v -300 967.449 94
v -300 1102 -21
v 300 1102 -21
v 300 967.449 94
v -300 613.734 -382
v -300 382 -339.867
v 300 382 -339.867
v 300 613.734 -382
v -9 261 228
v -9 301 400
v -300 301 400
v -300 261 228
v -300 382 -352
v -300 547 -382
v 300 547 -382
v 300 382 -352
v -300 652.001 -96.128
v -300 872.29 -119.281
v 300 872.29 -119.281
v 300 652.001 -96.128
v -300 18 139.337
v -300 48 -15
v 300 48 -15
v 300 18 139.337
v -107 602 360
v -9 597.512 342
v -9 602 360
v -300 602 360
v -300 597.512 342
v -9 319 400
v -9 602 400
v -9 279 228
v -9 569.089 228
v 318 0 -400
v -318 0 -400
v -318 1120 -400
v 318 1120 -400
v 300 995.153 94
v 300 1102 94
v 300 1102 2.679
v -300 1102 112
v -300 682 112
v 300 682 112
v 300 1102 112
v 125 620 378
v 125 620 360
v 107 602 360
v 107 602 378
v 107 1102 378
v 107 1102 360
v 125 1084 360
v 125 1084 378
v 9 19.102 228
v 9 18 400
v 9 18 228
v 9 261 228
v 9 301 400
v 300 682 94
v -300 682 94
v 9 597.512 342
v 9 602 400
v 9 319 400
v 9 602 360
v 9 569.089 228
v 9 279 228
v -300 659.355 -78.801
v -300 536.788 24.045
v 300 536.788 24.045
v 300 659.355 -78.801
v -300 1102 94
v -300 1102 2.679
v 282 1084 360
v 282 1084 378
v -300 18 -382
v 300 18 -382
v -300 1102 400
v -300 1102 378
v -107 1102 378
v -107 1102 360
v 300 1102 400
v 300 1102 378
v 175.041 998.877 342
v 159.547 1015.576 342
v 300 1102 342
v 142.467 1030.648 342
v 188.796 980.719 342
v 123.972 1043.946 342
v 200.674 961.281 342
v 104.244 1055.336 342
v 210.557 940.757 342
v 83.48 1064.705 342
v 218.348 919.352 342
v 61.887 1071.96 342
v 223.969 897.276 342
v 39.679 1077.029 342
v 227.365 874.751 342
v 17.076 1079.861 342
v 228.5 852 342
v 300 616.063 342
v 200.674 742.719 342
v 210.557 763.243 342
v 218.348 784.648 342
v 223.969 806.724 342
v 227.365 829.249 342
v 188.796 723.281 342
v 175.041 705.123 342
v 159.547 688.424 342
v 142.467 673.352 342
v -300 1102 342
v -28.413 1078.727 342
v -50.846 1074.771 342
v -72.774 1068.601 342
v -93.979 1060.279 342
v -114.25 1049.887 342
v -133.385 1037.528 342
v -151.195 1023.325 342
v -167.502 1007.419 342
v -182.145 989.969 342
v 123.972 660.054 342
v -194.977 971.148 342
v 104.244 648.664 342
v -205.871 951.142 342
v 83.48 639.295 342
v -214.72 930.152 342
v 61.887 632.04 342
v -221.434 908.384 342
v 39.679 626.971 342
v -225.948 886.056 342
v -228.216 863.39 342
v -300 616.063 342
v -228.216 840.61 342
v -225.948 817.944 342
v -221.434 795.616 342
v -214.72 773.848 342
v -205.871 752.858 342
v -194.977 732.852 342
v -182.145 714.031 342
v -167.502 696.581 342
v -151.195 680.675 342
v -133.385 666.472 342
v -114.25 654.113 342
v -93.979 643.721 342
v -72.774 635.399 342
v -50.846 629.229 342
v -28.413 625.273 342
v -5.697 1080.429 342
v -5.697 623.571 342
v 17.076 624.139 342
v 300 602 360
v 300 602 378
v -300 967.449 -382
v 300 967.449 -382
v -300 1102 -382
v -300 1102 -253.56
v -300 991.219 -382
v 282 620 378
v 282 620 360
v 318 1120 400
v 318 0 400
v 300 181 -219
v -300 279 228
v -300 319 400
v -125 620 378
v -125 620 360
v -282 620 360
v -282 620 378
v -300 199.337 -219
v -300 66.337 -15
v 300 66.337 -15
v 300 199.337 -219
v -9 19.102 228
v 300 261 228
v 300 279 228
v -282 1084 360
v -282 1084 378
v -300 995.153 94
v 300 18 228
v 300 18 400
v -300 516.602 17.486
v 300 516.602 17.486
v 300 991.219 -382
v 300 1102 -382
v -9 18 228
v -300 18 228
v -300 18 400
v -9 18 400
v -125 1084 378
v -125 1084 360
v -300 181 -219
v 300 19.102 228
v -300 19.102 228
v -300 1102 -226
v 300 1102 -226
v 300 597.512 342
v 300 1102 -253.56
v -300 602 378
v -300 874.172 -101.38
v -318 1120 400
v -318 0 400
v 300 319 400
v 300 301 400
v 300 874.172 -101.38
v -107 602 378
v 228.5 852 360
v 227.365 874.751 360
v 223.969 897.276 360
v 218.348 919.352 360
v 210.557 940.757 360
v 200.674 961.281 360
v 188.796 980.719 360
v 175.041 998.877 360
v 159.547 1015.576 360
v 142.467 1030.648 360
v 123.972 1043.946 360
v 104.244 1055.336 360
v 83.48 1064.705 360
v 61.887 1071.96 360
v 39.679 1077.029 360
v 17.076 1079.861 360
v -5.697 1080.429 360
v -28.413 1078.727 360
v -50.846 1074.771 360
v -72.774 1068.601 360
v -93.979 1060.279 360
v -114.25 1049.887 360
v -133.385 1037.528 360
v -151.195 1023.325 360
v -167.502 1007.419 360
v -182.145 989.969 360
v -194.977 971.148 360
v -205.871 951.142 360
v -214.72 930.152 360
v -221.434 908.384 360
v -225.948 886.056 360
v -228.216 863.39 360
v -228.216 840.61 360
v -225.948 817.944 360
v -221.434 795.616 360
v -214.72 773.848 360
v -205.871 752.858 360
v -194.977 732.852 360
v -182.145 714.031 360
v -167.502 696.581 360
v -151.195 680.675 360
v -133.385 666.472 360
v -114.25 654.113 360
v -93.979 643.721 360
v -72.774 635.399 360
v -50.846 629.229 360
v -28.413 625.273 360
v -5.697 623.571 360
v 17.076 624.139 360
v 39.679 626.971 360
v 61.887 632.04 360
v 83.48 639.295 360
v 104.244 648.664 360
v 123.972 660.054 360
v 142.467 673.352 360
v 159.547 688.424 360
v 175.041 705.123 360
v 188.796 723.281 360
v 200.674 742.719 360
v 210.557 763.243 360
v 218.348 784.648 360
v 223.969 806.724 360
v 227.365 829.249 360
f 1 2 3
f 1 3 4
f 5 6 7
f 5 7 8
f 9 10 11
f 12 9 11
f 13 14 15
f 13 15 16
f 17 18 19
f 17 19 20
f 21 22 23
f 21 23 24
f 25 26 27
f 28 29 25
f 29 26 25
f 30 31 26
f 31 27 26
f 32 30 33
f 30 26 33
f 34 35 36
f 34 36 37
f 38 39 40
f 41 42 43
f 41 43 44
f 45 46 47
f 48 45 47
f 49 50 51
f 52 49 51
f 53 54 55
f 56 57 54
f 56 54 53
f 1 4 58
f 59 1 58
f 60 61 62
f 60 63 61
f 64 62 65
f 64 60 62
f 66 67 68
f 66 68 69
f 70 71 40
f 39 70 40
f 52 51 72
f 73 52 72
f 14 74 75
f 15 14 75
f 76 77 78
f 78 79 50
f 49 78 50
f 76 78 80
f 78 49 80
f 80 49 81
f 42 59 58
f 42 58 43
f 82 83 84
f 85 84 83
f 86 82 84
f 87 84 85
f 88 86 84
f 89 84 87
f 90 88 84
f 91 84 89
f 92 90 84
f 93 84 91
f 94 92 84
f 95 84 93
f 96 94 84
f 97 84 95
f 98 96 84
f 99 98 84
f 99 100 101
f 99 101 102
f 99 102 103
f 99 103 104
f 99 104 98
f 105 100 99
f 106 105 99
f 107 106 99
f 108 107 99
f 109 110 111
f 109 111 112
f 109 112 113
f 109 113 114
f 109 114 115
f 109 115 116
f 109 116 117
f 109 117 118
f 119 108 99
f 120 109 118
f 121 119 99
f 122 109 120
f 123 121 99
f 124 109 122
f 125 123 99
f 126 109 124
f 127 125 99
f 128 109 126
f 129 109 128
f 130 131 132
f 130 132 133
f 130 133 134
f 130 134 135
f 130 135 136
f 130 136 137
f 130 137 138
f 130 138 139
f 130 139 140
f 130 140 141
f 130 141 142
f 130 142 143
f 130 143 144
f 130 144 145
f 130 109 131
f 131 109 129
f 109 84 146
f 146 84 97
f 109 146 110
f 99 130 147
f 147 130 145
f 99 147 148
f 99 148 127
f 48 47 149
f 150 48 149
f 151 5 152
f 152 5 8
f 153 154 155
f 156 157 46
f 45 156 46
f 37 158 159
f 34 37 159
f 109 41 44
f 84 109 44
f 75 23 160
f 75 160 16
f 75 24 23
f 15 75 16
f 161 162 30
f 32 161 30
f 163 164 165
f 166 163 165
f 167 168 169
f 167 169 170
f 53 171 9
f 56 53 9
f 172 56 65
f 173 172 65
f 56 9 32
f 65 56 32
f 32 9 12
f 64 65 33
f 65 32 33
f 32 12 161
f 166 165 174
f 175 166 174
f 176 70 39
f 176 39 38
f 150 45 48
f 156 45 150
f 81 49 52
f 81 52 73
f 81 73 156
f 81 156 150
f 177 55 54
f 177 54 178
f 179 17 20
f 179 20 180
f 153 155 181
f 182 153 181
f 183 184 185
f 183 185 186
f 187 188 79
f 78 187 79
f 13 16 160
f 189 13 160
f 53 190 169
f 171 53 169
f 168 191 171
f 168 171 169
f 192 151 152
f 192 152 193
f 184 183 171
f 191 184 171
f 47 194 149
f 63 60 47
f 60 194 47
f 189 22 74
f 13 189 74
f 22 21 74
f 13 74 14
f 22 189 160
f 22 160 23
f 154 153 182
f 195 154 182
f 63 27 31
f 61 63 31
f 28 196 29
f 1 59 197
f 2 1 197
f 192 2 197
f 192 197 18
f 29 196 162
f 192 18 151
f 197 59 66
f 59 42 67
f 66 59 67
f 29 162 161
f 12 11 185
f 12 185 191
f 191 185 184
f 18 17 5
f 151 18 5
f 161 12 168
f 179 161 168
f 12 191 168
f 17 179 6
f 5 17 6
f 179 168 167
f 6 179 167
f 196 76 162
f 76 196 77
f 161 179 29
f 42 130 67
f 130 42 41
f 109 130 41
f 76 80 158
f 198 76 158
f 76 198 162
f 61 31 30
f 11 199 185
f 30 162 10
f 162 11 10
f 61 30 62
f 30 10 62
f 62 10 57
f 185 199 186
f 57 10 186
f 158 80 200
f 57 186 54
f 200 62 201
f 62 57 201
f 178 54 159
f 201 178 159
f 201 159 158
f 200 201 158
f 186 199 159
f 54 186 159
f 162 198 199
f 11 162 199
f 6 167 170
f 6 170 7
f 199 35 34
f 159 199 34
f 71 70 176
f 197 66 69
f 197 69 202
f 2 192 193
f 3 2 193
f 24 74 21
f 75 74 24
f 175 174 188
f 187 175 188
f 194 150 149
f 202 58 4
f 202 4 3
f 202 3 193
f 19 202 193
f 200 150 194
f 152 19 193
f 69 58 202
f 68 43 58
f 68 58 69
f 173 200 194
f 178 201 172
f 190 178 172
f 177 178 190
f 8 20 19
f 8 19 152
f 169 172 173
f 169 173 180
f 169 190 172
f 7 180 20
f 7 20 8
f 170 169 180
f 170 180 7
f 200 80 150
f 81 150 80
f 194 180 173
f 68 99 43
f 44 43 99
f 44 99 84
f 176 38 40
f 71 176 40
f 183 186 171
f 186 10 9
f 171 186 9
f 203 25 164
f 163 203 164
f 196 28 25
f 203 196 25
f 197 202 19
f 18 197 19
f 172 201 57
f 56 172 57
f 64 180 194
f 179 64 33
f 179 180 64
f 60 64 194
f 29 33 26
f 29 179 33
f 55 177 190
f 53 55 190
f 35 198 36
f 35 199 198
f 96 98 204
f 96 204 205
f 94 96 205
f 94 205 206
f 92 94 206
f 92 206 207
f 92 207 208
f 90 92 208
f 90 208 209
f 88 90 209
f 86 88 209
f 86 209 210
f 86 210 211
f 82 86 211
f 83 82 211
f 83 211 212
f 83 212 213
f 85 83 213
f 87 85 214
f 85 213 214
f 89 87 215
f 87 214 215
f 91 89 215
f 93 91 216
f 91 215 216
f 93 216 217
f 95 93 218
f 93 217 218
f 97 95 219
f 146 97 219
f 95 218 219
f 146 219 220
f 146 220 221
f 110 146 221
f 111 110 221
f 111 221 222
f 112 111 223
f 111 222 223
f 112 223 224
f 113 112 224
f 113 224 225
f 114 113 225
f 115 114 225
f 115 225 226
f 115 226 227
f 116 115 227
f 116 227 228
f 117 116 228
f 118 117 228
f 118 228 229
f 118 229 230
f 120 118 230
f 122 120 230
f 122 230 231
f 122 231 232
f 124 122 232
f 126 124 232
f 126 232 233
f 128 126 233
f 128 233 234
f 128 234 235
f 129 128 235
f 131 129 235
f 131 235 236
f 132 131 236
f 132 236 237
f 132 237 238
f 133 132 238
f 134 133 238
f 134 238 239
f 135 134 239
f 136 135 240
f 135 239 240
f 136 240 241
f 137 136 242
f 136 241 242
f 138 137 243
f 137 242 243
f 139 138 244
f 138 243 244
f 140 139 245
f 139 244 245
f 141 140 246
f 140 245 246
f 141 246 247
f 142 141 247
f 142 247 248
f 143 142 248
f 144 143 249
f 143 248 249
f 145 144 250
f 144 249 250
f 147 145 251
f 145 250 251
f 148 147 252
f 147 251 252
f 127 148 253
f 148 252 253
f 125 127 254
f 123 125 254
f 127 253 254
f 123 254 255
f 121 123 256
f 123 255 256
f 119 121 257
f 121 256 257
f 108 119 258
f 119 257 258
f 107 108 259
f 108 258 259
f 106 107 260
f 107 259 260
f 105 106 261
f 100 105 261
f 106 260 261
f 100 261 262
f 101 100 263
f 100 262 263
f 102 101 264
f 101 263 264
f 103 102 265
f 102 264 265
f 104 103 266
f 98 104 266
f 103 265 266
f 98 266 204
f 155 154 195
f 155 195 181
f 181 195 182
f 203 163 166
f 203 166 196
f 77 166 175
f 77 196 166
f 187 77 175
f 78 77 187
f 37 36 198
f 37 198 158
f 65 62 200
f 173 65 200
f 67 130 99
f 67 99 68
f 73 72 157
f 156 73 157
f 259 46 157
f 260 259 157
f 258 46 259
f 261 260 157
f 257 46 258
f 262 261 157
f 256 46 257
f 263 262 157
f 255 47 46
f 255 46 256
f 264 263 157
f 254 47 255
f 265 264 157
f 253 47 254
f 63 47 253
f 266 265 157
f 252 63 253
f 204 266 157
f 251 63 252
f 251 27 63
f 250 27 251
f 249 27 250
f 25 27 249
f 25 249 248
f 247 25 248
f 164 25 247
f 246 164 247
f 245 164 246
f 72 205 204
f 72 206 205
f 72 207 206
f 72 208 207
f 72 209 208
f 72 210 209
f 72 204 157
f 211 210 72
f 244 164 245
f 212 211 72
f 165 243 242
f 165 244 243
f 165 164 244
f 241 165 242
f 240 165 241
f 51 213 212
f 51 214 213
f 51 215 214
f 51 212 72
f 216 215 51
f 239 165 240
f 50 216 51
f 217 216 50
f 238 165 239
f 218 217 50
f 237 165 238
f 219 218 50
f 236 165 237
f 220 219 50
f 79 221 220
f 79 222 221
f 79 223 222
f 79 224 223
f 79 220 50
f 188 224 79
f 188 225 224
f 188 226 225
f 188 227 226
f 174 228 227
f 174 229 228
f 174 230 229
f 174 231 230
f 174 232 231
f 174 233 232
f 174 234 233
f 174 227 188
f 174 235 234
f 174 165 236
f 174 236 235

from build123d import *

# Parameters (mm, degrees)
SKETCH1_W           = 636
SKETCH1_H           = 800
BOSS_EXTRUDE1_DEPTH = 18
BOSS_EXTRUDE2_DEPTH = 636
SKETCH4_W           = 636
SKETCH4_H           = 18
BOSS_EXTRUDE3_DEPTH = 1084
SKETCH5_W           = 636
SKETCH5_H           = 800
BOSS_EXTRUDE4_DEPTH = 18
BOSS_EXTRUDE6_DEPTH = 18
SKETCH11_W          = 18
SKETCH11_H          = 800
BOSS_EXTRUDE7_DEPTH = 1084
SKETCH13_W          = 636
SKETCH13_H          = 18
SKETCH15_W          = 18
SKETCH15_H          = 800
BOSS_EXTRUDE8_DEPTH = 1084
SKETCH16_R          = 228.5
CUT_EXTRUDE1_DEPTH  = 18.1
SKETCH17_W          = 18
SKETCH17_H          = 18
BOSS_EXTRUDE9_DEPTH = 18


with BuildPart() as part:
    # Sketch1 → Boss-Extrude1 (new body)
    with BuildSketch(Plane(origin=(0, 0, 0), x_dir=(1, 0, 0), z_dir=(0, 1, 0))):
        Rectangle(SKETCH1_W, SKETCH1_H)
    extrude(amount=BOSS_EXTRUDE1_DEPTH)

    # Sketch3 → Boss-Extrude2 (add)
    with BuildSketch(Plane.ZY.offset(318)):
        Polygon((139.336620479, 18), (228, 18), (228, 19.102485389), (-15, 66.336900509), (-219, 199.336900509), (-339.866628021, 382), (-382, 613.733545883), (-382, 547), (-352, 382), (-219, 181), (-15, 48), align=None)
        Polygon((360, 602), (360, 1102), (342, 1102), (342, 616.063141277), (24.044559613, 536.787946332), (-78.801457937, 659.355057231), (-101.379606002, 874.171786631), (-119.281000119, 872.290274292), (-96.127616004, 652.00053947), (4.612607271, 531.943016464), (17.485608625, 516.601570853), (342, 597.512095949), align=None)
        Polygon((112, 682), (112, 1102), (94, 1102), (94, 995.153242294), (2.678735209, 1102), (-21, 1102), (94, 967.448894468), (94, 682), align=None)
        Polygon((-226, 1102), (-253.559600781, 1102), (-382, 991.219245449), (-382, 967.448894468), align=None)
    extrude(amount=-BOSS_EXTRUDE2_DEPTH)


with BuildPart() as boss_extrude2_piece_1:
    # of the separate pieces the step leaves, piece 1, a body of its own (boss_extrude2_pieces)
    add(part.part.solids().sort_by_distance((-318, 0, 400))[0])



with BuildPart() as boss_extrude2_piece_2:
    # of the separate pieces the step leaves, piece 2, a body of its own (boss_extrude2_pieces)
    add(part.part.solids().sort_by_distance((-318, 602, 360))[0])


with BuildPart() as boss_extrude2_piece_3:
    # of the separate pieces the step leaves, piece 3, a body of its own (boss_extrude2_pieces)
    add(part.part.solids().sort_by_distance((-318, 682, 112))[0])


with BuildPart() as boss_extrude2_piece_4:
    # of the separate pieces the step leaves, piece 4, a body of its own (boss_extrude2_pieces)
    add(part.part.solids().sort_by_distance((-318, 1102, -226))[0])


with BuildPart() as boss_extrude2_piece_1_1:
    add(boss_extrude2_piece_1.part)

    add(boss_extrude2_piece_4.part)  # Boss-Extrude3 merges Boss-Extrude2 piece 4
    # Sketch4 → Boss-Extrude3 (add)
    with BuildSketch(Plane(origin=(0, 18, 0), x_dir=(1, 0, 0), z_dir=(0, 1, 0))):
        with Locations((0, 391)):
            Rectangle(SKETCH4_W, SKETCH4_H)
    extrude(amount=BOSS_EXTRUDE3_DEPTH)


    add(boss_extrude2_piece_2.part)  # Boss-Extrude4 merges Boss-Extrude2 piece 2

    add(boss_extrude2_piece_3.part)  # Boss-Extrude4 merges Boss-Extrude2 piece 3
    # Sketch5 → Boss-Extrude4 (add)
    with BuildSketch(Plane(origin=(0, 1102, 0), x_dir=(1, 0, 0), z_dir=(0, 1, 0))):
        Rectangle(SKETCH5_W, SKETCH5_H)
    extrude(amount=BOSS_EXTRUDE4_DEPTH)

    # Sketch10 → Boss-Extrude6 (add)
    with BuildSketch(Plane.ZY.offset(9)):
        Polygon((400, 18), (228, 18), (228, 569.088703625), (360, 602), (400, 602), align=None)
    extrude(amount=-BOSS_EXTRUDE6_DEPTH)

    # Sketch11 → Boss-Extrude7 (add)
    with BuildSketch(Plane(origin=(0, 18, 0), x_dir=(1, 0, 0), z_dir=(0, 1, 0))):
        with Locations((309, 0)):
            Rectangle(SKETCH11_W, SKETCH11_H)
    extrude(amount=BOSS_EXTRUDE7_DEPTH)

    # Sweep1: sweep along a path in Sketch14
    with BuildLine(Plane.ZY.offset(9)) as sweep1_path:
        Line((228, 261), (400, 301))
    # Sketch13 → Sweep1 (sweep)
    with BuildSketch(Plane(origin=(0, 0, 228), x_dir=(-1, 0, 0), z_dir=(0, 0, -1))):
        with Locations((0, 270)):
            Rectangle(SKETCH13_W, SKETCH13_H)
    sweep(path=sweep1_path.line)

    # Sketch15 → Boss-Extrude8 (add)
    with BuildSketch(Plane(origin=(0, 18, 0), x_dir=(1, 0, 0), z_dir=(0, 1, 0))):
        with Locations((-309, 0)):
            Rectangle(SKETCH15_W, SKETCH15_H)
    extrude(amount=BOSS_EXTRUDE8_DEPTH)

    # Sketch16 → Cut-Extrude1 (cut)
    with BuildSketch(Plane.XY.offset(360)):
        with Locations((0, 852)):
            Circle(SKETCH16_R)
    extrude(amount=-CUT_EXTRUDE1_DEPTH, mode=Mode.SUBTRACT)

    # Sketch17 → Boss-Extrude9 (add)
    with BuildSketch(Plane.XY.offset(360)):
        Polygon((300, 1102), (107, 1102), (125, 1084), (282, 1084), (282, 620), (300, 620), align=None)
        Polygon((-282, 620), (-282, 1084), (-125, 1084), (-107, 1102), (-300, 1102), (-300, 1084), (-300, 602), (-107, 602), (-125, 620), align=None)
        with Locations((291, 611)):
            Rectangle(SKETCH17_W, SKETCH17_H)
        Polygon((282, 602), (282, 620), (125, 620), (107, 602), align=None)
    extrude(amount=BOSS_EXTRUDE9_DEPTH)


solid = boss_extrude2_piece_1_1.part
